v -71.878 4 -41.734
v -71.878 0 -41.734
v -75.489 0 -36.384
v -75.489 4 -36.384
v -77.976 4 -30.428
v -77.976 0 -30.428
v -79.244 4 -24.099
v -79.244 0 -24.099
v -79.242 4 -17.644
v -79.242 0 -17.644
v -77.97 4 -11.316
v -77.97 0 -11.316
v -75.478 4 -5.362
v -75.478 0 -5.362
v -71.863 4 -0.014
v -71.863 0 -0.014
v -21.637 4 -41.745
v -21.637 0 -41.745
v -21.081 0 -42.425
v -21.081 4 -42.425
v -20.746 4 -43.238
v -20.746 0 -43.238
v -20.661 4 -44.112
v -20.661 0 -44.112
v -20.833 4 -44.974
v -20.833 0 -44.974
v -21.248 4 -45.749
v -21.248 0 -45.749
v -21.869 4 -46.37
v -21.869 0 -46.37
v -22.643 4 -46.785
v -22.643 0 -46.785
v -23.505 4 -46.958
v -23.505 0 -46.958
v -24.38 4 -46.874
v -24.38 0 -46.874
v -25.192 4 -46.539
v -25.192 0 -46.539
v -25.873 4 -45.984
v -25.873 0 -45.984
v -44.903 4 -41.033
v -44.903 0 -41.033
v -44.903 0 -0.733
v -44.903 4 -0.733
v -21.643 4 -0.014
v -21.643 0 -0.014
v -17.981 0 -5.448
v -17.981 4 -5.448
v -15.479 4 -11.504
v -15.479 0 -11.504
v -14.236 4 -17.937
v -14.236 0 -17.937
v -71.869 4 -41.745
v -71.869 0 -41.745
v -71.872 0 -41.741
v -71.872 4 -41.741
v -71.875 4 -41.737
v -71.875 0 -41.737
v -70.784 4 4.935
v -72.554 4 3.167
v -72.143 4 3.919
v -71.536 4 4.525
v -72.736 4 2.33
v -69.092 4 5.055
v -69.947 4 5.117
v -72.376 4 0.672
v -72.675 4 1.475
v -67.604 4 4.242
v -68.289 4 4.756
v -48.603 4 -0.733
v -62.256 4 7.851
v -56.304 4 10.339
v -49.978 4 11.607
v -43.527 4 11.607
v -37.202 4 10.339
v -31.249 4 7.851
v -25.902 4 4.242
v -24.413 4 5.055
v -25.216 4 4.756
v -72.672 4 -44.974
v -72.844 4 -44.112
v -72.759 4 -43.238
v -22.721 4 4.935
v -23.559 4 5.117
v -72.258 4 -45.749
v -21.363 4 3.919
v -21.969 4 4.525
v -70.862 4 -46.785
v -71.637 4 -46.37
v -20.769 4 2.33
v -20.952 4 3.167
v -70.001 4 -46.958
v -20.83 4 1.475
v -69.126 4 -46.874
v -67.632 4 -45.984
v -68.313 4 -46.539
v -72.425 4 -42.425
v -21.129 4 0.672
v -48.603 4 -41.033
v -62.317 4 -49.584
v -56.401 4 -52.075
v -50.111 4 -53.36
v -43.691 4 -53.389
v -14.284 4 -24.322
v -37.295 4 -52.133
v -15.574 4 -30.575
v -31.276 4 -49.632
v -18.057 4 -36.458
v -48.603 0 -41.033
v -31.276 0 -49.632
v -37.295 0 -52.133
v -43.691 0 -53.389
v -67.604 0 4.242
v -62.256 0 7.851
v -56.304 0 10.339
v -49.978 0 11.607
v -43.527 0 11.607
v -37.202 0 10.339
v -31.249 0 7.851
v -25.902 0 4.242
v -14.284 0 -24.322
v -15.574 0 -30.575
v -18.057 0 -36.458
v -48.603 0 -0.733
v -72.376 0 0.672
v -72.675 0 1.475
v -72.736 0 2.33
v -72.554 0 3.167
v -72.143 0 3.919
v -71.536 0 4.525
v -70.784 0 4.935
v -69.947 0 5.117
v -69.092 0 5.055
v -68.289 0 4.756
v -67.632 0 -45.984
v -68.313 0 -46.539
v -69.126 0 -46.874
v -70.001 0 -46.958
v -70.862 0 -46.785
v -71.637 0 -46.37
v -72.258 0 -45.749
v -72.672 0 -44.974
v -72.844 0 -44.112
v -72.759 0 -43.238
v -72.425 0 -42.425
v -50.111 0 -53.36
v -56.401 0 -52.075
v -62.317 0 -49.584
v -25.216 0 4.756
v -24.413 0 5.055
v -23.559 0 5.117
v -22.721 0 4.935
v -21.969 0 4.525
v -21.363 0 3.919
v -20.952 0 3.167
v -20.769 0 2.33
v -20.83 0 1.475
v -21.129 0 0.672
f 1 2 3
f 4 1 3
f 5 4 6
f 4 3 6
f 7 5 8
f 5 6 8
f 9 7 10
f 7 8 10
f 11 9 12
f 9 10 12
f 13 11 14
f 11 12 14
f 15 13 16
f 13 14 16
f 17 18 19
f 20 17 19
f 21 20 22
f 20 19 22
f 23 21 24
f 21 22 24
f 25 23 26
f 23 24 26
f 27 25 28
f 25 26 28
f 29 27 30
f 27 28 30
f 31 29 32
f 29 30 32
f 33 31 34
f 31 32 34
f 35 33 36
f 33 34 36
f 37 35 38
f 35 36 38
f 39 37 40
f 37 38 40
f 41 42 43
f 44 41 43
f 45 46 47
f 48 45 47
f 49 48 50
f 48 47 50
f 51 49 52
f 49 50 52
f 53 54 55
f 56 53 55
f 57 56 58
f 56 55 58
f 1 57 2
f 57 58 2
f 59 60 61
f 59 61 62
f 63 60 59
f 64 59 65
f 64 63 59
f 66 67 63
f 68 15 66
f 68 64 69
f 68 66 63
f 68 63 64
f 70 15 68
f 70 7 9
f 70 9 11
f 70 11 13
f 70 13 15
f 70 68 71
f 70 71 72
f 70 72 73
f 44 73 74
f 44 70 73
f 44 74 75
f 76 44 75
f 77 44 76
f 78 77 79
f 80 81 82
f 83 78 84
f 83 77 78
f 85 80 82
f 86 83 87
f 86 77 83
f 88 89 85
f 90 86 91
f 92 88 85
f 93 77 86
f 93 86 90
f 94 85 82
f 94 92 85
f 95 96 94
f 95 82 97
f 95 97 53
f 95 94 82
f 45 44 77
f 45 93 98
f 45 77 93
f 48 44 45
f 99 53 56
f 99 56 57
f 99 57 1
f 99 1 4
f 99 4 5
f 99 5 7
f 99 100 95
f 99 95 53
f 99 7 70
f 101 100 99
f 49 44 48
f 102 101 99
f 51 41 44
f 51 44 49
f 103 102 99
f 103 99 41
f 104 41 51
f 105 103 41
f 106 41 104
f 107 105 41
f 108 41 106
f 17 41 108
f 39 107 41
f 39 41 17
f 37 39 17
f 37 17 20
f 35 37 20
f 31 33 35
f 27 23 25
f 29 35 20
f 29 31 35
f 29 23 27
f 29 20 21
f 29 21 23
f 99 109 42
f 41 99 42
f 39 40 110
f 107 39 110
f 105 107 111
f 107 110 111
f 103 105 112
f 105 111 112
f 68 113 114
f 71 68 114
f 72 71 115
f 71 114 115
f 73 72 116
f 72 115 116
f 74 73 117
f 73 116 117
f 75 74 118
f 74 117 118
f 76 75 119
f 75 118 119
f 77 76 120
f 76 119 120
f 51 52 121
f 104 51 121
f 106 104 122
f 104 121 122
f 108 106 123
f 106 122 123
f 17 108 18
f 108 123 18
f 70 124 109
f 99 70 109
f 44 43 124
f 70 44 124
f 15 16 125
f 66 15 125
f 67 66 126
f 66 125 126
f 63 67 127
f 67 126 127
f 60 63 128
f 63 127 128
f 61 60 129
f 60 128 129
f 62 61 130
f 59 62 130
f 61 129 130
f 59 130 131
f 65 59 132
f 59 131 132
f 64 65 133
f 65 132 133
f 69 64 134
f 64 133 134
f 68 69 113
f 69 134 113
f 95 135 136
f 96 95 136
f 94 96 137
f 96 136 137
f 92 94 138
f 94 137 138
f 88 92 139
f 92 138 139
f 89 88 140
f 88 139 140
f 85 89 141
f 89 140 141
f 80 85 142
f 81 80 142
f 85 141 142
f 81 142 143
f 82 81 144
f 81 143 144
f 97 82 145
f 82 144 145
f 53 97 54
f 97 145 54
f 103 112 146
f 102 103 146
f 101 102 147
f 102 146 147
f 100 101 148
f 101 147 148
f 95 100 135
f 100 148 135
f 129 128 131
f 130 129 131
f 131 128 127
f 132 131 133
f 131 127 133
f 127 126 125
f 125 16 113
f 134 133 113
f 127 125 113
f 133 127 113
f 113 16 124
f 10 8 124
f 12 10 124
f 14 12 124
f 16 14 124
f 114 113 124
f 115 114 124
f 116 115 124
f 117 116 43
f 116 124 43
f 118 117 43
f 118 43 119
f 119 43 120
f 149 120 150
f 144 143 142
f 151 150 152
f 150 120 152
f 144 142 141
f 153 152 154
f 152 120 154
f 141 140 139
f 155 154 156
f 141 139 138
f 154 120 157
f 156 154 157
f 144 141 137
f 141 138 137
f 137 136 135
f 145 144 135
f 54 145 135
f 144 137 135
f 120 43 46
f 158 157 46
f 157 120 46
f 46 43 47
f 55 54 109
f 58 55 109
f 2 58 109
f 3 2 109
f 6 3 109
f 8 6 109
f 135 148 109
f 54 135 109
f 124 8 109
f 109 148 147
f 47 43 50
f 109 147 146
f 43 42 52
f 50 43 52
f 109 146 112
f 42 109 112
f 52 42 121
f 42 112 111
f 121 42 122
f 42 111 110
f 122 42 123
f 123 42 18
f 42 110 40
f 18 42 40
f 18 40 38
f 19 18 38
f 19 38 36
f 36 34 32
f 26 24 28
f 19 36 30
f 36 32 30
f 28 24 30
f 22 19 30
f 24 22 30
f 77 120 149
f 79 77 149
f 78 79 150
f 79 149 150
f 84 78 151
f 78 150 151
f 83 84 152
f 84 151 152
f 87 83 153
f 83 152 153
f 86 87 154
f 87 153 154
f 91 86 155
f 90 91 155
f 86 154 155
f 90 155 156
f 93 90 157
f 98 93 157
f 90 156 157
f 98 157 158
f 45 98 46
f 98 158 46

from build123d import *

# Parameters (mm, degrees)
BOSS_EXTRUDE1_DEPTH = 4


with BuildPart() as part:
    # Sketch1 → Boss-Extrude1 (new body)
    with BuildSketch(Plane(origin=(0, 0, 0), x_dir=(1, 0, 0), z_dir=(0, 1, 0))):
        with BuildLine():
            ThreePointArc((-71.868882923, 41.744528782), (-71.873310505, 41.73919705), (-71.877736955, 41.733864379))
            ThreePointArc((-71.877736955, 41.733864379), (-79.402730452, 20.871324191), (-71.862759828, 0.01419224))
            ThreePointArc((-71.862759828, 0.01419224), (-71.861231345, -4.243487526), (-67.603551579, -4.241959043))
            ThreePointArc((-67.603551579, -4.241959043), (-46.752732556, -11.766954644), (-25.901913533, -4.241959043))
            ThreePointArc((-25.901913533, -4.241959043), (-21.644233766, -4.243487526), (-21.642705283, 0.01419224))
            ThreePointArc((-21.642705283, 0.01419224), (-16.577915273, 8.412965085), (-14.235919977, 17.936963257))
            ThreePointArc((-14.235919977, 17.936963257), (-15.574380313, 30.574941531), (-21.636582188, 41.744528782))
            ThreePointArc((-21.636582188, 41.744528782), (-21.535327773, 46.082350824), (-25.873221397, 45.984210943))
            ThreePointArc((-25.873221397, 45.984210943), (-34.22276847, 51.033045356), (-43.691357182, 53.389206016))
            ThreePointArc((-43.691357182, 53.389206016), (-56.400529129, 52.075071922), (-67.632243714, 45.984210943))
            ThreePointArc((-67.632243714, 45.984210943), (-71.970137338, 46.082350824), (-71.868882923, 41.744528782))
        make_face()
        Polygon((-48.602732556, 0.733045356), (-48.602732556, 20.883045356), (-48.602732556, 41.033045356), (-44.902732556, 41.033045356), (-44.902732556, 20.883045356), (-44.902732556, 0.733045356), align=None, mode=Mode.SUBTRACT)
    extrude(amount=BOSS_EXTRUDE1_DEPTH)


solid = part.part
